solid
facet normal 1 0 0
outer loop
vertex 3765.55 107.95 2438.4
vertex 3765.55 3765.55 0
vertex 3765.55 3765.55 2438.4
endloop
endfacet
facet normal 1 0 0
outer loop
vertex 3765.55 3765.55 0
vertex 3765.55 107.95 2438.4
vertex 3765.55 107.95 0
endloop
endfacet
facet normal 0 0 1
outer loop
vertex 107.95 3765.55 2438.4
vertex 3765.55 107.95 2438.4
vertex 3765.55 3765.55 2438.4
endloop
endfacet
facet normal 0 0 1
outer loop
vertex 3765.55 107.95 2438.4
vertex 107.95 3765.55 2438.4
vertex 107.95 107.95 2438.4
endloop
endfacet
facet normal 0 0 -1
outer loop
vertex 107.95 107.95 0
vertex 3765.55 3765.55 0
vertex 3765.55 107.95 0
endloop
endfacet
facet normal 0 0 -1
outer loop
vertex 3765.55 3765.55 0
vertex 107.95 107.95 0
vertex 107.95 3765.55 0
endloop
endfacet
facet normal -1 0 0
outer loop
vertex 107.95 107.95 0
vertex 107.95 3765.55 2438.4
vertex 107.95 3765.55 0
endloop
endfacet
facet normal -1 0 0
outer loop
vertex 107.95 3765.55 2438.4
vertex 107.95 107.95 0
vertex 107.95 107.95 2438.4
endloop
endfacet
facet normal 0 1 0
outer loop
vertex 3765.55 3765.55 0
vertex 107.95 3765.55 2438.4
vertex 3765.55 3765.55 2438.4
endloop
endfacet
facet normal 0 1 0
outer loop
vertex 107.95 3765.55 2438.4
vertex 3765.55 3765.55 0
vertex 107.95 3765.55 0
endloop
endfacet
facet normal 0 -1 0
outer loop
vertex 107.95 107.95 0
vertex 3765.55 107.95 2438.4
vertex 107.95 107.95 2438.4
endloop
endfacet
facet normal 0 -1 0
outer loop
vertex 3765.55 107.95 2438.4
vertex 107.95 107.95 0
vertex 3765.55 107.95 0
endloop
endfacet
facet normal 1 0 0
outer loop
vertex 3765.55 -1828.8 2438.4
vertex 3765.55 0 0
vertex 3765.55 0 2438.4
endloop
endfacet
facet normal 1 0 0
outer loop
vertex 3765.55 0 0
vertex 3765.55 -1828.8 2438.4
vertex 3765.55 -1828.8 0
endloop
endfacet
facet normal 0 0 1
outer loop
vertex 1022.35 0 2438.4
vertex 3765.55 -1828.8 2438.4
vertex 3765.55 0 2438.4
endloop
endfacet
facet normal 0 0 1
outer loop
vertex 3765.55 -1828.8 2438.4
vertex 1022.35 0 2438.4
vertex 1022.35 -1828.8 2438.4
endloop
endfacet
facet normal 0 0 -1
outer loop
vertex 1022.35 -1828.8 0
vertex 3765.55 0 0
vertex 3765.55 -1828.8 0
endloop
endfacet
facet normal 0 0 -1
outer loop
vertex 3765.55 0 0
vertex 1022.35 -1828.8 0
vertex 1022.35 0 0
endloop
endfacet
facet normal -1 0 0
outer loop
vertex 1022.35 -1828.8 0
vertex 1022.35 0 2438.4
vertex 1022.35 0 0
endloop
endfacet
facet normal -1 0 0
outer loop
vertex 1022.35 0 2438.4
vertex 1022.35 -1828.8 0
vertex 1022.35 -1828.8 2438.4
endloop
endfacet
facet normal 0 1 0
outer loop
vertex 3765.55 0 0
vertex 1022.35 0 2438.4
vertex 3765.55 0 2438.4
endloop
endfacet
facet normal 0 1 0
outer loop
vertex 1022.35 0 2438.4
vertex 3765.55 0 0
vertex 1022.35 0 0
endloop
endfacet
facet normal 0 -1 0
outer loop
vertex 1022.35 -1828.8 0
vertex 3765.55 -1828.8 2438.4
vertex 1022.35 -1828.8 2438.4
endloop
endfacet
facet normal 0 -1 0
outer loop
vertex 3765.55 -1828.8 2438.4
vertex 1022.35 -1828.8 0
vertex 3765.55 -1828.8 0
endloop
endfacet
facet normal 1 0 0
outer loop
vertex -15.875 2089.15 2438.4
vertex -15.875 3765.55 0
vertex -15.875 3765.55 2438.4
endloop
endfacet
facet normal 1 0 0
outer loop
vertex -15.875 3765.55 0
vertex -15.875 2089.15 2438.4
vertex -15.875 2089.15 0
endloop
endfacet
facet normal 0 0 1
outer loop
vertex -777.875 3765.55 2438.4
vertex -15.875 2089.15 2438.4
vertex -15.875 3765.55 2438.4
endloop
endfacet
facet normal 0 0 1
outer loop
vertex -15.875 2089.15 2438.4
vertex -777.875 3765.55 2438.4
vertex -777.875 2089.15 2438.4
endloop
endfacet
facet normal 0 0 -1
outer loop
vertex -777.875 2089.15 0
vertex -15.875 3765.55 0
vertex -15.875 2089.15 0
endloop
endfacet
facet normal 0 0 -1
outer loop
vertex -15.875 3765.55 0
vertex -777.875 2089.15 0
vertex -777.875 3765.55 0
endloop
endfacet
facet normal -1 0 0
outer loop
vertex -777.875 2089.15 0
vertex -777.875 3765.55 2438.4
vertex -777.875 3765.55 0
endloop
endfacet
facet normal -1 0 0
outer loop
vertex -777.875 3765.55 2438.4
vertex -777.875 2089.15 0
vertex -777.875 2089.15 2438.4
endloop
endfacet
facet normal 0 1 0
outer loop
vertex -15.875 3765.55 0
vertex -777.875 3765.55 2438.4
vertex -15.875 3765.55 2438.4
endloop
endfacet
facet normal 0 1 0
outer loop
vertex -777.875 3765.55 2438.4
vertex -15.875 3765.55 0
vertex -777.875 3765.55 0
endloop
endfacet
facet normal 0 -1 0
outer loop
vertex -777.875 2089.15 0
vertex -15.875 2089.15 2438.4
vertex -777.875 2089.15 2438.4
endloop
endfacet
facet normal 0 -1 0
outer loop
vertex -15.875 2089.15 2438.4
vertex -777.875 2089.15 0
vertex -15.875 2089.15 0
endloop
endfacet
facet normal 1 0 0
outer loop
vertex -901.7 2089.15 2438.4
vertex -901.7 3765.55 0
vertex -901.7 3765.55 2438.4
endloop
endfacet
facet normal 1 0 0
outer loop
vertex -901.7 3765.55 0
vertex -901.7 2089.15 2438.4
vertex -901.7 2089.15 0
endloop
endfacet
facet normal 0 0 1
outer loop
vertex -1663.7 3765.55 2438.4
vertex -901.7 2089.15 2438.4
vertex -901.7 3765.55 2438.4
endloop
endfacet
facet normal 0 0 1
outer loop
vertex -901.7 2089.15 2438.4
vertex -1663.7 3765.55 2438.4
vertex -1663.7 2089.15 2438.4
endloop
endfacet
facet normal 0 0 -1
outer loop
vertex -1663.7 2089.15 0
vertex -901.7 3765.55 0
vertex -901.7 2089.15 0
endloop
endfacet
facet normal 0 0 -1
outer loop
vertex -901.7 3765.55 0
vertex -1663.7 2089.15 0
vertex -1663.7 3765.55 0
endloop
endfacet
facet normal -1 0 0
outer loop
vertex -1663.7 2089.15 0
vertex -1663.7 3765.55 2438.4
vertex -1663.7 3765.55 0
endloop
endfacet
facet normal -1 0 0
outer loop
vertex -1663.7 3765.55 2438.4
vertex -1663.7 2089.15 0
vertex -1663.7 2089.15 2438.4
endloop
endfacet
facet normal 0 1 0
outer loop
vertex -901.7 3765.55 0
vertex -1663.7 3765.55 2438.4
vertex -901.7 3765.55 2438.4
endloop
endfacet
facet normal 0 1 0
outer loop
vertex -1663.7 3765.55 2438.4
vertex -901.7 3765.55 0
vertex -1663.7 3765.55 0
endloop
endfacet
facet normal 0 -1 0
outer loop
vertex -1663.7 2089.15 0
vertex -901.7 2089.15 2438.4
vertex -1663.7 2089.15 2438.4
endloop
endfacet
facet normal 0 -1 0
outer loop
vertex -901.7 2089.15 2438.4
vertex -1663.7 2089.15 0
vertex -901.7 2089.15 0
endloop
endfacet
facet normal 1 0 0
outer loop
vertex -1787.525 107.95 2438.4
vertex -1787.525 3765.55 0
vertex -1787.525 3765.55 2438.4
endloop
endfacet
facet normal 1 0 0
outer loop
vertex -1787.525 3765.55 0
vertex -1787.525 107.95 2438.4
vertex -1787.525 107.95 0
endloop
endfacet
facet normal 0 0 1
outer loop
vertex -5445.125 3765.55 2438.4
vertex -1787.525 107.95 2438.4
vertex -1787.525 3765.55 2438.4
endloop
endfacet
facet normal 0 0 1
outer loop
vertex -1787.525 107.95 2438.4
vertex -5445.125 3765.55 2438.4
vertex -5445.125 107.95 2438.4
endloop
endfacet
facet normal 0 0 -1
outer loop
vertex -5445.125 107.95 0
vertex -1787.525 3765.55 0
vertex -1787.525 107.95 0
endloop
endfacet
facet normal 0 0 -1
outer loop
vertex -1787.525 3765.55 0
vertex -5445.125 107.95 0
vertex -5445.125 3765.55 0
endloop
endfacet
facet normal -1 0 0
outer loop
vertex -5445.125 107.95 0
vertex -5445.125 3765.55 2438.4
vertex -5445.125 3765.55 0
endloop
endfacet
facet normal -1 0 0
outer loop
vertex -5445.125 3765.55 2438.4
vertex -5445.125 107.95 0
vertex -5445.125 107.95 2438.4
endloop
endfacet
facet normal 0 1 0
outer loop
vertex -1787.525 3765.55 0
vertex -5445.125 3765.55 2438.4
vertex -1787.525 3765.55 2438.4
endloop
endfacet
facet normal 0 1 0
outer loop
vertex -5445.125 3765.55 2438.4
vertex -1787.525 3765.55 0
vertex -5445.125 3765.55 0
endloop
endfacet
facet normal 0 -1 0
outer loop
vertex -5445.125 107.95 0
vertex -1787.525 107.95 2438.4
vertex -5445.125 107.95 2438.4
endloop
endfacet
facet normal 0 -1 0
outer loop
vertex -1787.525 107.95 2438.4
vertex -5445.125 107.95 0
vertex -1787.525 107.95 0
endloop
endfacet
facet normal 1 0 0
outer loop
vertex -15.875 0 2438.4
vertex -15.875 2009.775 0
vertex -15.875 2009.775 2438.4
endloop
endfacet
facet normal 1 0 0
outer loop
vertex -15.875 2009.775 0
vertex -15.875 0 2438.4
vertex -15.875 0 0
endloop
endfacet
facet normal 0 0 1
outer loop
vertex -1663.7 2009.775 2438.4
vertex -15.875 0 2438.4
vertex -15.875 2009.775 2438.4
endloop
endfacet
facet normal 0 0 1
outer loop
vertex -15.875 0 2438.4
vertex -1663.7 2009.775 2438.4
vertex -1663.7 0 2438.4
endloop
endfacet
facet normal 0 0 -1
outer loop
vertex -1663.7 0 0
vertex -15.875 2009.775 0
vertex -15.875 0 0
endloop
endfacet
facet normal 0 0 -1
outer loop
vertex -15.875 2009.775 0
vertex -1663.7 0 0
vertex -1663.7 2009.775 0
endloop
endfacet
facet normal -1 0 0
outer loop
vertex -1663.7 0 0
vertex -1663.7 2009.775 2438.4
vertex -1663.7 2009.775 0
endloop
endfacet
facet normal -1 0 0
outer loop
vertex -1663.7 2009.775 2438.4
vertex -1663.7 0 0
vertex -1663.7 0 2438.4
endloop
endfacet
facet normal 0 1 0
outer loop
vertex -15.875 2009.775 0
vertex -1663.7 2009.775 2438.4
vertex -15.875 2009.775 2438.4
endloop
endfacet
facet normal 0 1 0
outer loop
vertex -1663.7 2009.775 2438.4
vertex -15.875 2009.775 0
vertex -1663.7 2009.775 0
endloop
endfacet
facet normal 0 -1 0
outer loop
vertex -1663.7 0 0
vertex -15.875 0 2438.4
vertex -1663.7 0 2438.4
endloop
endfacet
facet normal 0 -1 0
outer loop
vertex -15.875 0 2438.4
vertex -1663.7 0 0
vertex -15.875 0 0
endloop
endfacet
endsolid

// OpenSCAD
inch=25.4;
foot=12*inch;
two=1.625*inch;
four=3.625*inch;
six=5.625*inch;
eight=7.625*inch;
wall=0.625*inch;

module space(l,w){
    cube([l,w,8*foot]);
}


// Master Bed

color([1,0,0,0.4]){

    translate([four+wall,four+wall,0])
    space(12*foot,12*foot);


    translate([four+wall+3*foot,-6*foot])
    space(9*foot,6*foot);

    translate([-30*inch-wall,12*foot-66*inch+wall+four])
    space(30*inch,66*inch);
    
}

// Dining Room

color([1,0.6,0,0.4]){
    translate([-30*inch*2-wall*3-four,12*foot-66*inch+wall+four])
    space(30*inch,66*inch);

    translate([-30*inch*2-wall*5-four*2-12*foot,four+wall,0])
    space(12*foot,12*foot);
}

color([1,0,1,0.4]){
    translate([-wall-30*inch*2-wall*2-four,0])
    space(30*inch*2+wall*2+four,12*foot-60*inch-wall*2-four);
}
